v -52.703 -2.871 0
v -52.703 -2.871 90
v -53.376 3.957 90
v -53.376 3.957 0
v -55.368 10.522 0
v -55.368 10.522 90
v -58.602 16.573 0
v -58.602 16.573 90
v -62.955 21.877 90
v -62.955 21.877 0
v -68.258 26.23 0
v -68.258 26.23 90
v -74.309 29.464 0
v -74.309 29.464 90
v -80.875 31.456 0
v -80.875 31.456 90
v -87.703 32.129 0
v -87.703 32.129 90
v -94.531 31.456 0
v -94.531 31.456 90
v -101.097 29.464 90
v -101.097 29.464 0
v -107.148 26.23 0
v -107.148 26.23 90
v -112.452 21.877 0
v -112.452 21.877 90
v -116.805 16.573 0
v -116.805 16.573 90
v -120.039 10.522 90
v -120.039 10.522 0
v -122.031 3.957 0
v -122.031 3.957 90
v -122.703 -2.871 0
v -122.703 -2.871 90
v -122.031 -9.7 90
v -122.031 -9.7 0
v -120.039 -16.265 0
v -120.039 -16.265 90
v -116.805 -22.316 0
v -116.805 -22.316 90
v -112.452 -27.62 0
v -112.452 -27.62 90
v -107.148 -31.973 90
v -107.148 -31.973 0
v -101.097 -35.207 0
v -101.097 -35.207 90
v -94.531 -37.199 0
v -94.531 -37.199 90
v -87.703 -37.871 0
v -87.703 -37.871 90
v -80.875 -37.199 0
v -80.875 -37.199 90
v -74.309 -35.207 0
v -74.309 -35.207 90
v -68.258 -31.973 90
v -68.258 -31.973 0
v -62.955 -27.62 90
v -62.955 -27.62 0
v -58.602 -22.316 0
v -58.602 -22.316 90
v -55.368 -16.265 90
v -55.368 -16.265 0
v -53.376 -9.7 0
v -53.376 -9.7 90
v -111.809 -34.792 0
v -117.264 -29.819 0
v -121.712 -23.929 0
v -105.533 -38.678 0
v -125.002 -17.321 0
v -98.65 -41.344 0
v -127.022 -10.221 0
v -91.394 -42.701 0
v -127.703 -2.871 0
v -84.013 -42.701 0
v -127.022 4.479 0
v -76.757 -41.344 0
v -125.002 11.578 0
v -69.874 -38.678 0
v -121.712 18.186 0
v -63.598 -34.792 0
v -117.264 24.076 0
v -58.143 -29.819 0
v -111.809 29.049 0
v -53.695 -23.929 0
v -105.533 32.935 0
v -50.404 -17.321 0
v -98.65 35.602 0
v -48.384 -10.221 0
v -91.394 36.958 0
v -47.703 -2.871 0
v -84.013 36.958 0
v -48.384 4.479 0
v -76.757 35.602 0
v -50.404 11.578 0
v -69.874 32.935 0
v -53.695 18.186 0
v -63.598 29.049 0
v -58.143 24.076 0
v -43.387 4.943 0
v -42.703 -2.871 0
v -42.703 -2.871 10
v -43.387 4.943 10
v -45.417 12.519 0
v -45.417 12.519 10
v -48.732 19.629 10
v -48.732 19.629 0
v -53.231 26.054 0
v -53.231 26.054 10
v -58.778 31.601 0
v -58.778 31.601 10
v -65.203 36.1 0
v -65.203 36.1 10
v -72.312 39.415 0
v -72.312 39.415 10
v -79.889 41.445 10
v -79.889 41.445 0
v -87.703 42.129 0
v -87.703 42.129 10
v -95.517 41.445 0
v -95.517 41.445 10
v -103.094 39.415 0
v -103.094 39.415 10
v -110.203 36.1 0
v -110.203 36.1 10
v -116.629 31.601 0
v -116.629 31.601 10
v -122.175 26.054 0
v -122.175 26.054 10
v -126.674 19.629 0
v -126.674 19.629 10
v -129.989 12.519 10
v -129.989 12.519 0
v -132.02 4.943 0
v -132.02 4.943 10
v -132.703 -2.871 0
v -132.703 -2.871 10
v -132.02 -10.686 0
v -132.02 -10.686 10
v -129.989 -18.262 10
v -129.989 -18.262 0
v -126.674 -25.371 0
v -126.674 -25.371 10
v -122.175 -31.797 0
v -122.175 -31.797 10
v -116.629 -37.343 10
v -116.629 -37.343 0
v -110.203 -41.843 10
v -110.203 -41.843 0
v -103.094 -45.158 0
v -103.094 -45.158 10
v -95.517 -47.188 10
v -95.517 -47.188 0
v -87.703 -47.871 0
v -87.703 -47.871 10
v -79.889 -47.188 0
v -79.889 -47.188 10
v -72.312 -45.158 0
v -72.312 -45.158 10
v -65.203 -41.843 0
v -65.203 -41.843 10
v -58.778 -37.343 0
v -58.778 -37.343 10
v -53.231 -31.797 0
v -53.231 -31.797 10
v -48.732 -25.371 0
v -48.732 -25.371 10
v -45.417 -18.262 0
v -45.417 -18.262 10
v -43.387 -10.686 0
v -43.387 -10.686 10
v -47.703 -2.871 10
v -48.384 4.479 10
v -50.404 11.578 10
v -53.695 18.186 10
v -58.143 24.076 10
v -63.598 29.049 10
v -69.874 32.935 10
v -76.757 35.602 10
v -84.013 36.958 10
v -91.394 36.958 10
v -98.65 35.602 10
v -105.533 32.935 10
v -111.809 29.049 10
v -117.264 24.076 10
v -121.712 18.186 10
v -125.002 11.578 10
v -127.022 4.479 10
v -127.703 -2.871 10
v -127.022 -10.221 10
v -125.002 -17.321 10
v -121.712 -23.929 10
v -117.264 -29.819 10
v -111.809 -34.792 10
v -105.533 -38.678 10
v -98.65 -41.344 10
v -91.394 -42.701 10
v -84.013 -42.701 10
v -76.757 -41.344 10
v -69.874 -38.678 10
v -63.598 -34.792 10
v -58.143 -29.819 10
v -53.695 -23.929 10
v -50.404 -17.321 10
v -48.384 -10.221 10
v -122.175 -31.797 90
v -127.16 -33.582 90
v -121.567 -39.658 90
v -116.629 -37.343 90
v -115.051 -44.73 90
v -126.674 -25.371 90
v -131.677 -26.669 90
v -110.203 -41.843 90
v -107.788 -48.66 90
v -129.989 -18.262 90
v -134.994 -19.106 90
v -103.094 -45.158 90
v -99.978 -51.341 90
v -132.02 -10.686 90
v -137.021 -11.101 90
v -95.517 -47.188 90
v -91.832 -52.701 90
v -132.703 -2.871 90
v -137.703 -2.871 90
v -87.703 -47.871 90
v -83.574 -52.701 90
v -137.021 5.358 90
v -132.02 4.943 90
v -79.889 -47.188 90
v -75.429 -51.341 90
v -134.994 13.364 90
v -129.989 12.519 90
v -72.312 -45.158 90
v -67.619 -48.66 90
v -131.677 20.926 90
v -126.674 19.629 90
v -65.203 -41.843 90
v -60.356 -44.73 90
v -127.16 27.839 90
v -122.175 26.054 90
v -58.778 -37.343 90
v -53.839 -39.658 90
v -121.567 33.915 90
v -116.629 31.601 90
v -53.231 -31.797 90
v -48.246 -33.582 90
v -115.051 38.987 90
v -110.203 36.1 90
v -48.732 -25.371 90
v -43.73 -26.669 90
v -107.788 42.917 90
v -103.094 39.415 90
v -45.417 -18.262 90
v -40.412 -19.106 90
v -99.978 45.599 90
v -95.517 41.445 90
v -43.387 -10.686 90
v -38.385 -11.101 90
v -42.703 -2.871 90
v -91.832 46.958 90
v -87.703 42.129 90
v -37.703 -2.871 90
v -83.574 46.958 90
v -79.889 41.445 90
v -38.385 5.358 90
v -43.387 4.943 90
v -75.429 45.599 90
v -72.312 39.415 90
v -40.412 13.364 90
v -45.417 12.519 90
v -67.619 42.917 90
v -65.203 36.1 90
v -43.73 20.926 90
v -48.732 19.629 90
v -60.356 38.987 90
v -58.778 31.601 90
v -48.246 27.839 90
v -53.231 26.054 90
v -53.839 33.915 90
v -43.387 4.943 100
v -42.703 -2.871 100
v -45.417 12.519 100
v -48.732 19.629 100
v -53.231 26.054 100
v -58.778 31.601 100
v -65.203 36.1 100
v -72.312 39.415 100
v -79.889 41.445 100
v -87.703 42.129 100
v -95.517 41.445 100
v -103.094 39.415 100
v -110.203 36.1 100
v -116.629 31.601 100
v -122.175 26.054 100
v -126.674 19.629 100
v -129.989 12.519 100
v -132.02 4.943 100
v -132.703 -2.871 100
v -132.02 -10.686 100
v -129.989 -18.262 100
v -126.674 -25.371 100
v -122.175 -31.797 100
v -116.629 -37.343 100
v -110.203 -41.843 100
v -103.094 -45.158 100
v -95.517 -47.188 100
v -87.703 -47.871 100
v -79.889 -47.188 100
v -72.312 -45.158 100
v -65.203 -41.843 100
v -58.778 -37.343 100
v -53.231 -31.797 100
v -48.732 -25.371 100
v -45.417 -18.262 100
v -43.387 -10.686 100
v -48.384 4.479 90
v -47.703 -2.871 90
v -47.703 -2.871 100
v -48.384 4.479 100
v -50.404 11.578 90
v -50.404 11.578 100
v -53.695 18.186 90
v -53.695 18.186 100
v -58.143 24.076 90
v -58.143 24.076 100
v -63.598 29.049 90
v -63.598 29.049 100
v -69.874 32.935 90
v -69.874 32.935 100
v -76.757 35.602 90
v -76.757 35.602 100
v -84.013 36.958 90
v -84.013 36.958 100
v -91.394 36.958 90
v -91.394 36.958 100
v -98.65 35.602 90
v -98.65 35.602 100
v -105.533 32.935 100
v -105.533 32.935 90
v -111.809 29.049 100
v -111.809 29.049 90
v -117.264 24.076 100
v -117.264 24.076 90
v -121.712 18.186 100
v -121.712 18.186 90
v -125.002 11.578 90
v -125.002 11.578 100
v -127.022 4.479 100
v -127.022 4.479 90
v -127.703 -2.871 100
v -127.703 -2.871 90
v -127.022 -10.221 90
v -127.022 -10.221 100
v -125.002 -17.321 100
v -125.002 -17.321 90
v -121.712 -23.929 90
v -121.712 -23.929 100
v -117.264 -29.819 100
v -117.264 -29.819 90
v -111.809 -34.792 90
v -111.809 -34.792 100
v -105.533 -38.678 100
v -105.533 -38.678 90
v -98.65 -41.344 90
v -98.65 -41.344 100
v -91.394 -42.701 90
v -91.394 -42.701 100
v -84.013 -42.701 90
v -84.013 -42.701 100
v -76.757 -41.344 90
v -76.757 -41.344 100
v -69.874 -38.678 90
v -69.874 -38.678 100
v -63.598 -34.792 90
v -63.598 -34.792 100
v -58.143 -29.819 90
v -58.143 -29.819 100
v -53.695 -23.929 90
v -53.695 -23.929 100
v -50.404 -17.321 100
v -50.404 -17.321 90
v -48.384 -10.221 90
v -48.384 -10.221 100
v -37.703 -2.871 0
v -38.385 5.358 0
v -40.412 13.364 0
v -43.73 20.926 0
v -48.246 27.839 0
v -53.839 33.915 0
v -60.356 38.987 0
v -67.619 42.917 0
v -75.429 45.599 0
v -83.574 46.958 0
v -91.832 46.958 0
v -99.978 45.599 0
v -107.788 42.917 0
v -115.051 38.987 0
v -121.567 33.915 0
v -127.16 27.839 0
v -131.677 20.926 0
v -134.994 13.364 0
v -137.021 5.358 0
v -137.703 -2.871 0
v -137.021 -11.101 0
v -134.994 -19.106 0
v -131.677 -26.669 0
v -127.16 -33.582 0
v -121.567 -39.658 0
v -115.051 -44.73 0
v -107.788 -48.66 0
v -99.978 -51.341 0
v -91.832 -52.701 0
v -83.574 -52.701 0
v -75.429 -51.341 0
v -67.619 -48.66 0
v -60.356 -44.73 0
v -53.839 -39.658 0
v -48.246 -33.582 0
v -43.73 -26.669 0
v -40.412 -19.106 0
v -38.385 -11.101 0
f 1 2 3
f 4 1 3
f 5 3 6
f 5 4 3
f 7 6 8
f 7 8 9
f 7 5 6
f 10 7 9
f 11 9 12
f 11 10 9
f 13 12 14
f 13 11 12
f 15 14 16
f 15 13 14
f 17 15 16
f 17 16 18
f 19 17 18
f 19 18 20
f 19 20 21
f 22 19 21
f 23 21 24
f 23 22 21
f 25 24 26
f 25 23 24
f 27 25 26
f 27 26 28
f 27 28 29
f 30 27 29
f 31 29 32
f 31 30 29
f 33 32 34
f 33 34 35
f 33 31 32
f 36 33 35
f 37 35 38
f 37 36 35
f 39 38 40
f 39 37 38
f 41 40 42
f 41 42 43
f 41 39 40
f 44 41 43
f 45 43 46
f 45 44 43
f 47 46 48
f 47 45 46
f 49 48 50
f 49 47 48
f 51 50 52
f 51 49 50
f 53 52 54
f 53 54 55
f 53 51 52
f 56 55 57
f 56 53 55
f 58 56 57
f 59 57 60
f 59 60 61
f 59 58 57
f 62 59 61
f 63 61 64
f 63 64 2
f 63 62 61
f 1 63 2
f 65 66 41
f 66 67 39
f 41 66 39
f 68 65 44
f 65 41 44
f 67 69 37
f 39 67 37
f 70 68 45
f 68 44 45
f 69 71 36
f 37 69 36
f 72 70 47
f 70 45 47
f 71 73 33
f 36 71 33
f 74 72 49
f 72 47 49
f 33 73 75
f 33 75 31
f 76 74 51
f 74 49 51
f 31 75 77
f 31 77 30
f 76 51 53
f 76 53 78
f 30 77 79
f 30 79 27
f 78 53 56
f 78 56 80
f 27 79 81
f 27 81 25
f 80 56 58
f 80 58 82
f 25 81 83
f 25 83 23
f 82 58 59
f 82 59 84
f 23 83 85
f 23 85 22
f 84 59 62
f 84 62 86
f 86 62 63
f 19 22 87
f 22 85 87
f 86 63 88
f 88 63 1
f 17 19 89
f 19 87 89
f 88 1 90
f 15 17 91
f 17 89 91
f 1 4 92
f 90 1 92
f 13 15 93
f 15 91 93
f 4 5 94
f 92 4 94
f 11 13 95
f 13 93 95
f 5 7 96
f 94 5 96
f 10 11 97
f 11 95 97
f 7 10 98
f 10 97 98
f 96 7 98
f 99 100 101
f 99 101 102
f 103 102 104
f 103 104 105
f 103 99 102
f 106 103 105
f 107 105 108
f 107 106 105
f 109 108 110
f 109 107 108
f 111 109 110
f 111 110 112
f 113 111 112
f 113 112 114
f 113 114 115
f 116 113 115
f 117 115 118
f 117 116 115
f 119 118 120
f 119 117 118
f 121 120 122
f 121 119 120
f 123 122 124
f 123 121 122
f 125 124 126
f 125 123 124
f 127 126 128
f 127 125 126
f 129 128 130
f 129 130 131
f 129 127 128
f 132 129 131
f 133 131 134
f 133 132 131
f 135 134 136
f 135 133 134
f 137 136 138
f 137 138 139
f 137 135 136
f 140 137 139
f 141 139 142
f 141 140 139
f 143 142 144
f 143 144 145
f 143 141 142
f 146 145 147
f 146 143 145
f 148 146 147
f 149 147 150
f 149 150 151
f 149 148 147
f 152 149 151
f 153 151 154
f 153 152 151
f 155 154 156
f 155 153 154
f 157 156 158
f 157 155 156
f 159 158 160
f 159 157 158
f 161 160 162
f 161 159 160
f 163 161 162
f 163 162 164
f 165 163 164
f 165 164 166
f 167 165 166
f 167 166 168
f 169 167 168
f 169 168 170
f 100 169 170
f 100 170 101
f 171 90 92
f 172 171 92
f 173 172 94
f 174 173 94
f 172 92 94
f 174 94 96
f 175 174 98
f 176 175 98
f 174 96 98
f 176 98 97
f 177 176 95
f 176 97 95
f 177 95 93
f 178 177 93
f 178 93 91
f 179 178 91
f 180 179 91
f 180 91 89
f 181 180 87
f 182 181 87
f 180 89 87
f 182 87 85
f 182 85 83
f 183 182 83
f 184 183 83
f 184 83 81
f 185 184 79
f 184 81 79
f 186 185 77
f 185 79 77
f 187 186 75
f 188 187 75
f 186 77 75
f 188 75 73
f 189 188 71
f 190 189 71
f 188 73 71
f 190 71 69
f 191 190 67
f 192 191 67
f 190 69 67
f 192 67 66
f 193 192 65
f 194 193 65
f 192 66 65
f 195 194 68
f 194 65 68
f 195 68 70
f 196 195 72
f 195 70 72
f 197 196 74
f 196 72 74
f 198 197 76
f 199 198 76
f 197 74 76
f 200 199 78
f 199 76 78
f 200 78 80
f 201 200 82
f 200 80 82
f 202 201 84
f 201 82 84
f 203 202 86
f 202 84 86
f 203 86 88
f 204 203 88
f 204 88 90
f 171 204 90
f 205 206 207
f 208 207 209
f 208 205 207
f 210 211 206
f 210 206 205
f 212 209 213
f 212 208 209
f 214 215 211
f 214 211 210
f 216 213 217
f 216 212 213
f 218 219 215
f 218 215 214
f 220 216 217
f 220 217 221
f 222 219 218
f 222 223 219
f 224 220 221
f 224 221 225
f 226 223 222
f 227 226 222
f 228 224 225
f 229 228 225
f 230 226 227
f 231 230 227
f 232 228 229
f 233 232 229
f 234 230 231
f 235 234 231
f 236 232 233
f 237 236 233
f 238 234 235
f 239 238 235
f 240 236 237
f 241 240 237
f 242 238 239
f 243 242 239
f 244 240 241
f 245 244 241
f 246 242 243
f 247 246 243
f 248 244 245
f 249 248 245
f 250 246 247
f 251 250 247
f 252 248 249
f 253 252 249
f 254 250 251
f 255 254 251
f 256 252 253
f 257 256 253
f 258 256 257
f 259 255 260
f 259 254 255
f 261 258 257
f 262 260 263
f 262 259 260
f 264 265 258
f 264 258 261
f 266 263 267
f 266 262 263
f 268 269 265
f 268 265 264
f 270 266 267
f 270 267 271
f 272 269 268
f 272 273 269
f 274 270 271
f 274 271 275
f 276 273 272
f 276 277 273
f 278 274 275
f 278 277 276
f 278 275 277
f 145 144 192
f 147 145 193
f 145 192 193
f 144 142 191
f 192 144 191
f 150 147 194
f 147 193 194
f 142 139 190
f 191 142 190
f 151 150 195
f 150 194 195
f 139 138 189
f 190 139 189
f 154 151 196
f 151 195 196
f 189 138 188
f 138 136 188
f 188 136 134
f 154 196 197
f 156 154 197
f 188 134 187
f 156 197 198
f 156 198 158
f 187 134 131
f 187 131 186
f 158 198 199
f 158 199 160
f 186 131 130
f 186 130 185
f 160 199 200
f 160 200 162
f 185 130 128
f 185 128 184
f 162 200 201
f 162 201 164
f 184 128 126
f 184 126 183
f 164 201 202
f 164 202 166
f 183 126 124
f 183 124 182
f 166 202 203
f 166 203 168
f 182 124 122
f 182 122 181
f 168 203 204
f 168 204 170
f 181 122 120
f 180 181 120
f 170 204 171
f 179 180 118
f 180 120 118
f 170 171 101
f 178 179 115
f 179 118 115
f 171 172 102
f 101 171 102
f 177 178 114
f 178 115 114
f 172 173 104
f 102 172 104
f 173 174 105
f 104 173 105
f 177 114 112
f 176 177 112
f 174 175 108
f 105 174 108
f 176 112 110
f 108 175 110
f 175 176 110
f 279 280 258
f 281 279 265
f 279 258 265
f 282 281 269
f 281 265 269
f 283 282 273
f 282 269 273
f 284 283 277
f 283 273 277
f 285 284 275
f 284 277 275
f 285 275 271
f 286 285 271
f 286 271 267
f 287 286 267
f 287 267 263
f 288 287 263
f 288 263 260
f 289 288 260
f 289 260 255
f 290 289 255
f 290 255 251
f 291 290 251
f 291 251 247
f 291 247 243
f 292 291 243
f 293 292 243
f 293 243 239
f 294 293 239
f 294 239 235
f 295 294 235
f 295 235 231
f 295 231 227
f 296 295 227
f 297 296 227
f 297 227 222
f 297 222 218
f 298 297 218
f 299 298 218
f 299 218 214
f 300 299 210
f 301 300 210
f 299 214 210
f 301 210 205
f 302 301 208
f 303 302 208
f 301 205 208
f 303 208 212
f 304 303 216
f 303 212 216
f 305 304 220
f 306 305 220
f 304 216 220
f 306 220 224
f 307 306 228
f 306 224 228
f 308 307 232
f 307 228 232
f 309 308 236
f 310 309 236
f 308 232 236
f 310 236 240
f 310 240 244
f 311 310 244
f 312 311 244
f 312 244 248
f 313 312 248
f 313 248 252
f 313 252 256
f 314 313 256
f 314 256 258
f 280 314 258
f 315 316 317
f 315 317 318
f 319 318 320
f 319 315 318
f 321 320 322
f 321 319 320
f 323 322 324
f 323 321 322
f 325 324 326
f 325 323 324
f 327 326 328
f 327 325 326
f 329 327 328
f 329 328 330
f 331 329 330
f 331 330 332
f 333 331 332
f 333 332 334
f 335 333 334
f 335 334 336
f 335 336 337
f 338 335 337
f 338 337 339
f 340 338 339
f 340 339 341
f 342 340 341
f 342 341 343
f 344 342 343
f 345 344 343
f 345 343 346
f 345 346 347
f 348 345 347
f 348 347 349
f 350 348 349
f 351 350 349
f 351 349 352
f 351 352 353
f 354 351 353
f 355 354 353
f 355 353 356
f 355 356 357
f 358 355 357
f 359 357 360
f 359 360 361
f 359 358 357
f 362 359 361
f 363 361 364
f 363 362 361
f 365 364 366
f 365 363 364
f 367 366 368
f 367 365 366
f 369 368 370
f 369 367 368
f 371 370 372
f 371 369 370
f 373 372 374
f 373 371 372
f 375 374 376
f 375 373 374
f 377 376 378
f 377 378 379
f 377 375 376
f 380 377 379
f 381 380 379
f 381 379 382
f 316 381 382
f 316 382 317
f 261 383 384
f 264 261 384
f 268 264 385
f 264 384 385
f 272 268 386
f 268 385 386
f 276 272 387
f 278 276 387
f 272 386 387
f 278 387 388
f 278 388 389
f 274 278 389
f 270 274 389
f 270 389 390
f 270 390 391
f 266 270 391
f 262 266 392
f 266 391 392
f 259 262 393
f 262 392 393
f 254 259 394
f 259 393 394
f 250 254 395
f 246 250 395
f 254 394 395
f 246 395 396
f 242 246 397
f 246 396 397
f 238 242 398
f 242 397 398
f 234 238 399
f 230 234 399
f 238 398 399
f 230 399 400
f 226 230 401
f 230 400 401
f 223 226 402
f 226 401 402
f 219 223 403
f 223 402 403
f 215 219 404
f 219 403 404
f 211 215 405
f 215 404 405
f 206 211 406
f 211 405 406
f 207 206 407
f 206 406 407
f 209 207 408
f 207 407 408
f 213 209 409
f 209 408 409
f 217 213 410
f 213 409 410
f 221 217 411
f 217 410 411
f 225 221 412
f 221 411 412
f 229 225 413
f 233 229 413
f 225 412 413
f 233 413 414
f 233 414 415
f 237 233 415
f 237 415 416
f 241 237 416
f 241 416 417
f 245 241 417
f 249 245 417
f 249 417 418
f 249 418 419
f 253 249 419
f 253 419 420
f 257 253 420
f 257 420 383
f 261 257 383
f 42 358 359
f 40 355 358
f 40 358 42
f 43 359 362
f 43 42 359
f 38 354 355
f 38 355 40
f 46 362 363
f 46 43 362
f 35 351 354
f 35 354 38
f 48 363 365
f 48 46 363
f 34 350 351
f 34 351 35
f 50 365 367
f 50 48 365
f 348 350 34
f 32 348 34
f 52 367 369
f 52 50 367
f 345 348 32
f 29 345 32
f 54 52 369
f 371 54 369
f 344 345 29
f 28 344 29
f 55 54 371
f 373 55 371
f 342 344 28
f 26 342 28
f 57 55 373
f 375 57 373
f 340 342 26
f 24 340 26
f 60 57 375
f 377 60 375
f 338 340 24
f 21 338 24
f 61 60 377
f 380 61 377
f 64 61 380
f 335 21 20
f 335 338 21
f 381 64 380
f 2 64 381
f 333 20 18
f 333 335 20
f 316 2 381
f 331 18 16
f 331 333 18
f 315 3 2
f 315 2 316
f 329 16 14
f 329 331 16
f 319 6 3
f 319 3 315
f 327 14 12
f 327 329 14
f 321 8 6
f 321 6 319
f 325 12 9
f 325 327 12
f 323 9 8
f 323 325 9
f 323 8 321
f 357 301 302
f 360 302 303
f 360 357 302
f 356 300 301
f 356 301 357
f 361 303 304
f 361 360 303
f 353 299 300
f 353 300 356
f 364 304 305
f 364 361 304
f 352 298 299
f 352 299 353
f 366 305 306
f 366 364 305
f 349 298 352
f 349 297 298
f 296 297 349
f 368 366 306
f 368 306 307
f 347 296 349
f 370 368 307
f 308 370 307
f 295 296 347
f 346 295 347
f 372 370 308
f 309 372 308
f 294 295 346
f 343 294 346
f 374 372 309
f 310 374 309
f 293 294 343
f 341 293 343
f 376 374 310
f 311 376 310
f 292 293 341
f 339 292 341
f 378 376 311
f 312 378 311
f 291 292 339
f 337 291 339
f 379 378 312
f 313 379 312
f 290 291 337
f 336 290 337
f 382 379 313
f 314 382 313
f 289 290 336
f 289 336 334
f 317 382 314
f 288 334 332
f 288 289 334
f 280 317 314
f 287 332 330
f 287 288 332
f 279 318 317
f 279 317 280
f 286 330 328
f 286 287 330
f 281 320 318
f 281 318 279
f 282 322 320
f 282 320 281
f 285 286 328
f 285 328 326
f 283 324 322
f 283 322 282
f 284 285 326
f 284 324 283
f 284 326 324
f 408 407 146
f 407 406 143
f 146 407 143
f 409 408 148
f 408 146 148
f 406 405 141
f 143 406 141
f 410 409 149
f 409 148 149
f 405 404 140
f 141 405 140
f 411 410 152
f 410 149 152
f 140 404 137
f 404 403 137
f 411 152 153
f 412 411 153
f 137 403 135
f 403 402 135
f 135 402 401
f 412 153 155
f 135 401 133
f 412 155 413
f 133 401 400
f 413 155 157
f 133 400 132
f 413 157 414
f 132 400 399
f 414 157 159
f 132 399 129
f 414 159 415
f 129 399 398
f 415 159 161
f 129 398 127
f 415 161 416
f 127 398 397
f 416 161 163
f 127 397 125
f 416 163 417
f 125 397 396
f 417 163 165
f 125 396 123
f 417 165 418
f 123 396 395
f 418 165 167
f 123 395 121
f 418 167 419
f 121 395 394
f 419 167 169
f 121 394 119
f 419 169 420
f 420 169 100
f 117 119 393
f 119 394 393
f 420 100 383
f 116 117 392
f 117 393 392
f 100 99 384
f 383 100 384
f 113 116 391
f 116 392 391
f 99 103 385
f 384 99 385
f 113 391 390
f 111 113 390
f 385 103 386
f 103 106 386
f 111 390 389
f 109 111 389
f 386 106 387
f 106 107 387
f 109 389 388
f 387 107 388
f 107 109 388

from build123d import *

# Parameters (mm, degrees)
F0_R     = 50
F0_R_2   = 45
F0_R_3   = 40
F0_R_4   = 35
F1_DEPTH = 90
F2_DEPTH = 100
F3_DEPTH = 10


with BuildPart() as f1:
    # F0 (on Top) → F1 (new body)
    with BuildSketch(Plane.XY):
        with Locations((-87.7033099532, -2.8714591172)):
            Circle(F0_R)
        with Locations((-87.7033099532, -2.8714591172)):
            Circle(F0_R_2, mode=Mode.SUBTRACT)
        with Locations((-87.7033099532, -2.8714591172)):
            Circle(F0_R_2)
        with Locations((-87.7033099532, -2.8714591172)):
            Circle(F0_R_3, mode=Mode.SUBTRACT)
        with Locations((-87.7033099532, -2.8714591172)):
            Circle(F0_R_3)
        with Locations((-87.7033099532, -2.8714591172)):
            Circle(F0_R_4, mode=Mode.SUBTRACT)
    extrude(amount=F1_DEPTH)

    # F0 (on Top) → F2 (join)
    with BuildSketch(Plane.XY):
        with Locations((-87.7033099532, -2.8714591172)):
            Circle(F0_R_2)
        with Locations((-87.7033099532, -2.8714591172)):
            Circle(F0_R_3, mode=Mode.SUBTRACT)
    extrude(amount=F2_DEPTH)

    # F0 (on Top) → F3 (cut)
    with BuildSketch(Plane.XY):
        with Locations((-87.7033099532, -2.8714591172)):
            Circle(F0_R_2)
        with Locations((-87.7033099532, -2.8714591172)):
            Circle(F0_R_3, mode=Mode.SUBTRACT)
    extrude(amount=F3_DEPTH, mode=Mode.SUBTRACT)


solid = f1.part
